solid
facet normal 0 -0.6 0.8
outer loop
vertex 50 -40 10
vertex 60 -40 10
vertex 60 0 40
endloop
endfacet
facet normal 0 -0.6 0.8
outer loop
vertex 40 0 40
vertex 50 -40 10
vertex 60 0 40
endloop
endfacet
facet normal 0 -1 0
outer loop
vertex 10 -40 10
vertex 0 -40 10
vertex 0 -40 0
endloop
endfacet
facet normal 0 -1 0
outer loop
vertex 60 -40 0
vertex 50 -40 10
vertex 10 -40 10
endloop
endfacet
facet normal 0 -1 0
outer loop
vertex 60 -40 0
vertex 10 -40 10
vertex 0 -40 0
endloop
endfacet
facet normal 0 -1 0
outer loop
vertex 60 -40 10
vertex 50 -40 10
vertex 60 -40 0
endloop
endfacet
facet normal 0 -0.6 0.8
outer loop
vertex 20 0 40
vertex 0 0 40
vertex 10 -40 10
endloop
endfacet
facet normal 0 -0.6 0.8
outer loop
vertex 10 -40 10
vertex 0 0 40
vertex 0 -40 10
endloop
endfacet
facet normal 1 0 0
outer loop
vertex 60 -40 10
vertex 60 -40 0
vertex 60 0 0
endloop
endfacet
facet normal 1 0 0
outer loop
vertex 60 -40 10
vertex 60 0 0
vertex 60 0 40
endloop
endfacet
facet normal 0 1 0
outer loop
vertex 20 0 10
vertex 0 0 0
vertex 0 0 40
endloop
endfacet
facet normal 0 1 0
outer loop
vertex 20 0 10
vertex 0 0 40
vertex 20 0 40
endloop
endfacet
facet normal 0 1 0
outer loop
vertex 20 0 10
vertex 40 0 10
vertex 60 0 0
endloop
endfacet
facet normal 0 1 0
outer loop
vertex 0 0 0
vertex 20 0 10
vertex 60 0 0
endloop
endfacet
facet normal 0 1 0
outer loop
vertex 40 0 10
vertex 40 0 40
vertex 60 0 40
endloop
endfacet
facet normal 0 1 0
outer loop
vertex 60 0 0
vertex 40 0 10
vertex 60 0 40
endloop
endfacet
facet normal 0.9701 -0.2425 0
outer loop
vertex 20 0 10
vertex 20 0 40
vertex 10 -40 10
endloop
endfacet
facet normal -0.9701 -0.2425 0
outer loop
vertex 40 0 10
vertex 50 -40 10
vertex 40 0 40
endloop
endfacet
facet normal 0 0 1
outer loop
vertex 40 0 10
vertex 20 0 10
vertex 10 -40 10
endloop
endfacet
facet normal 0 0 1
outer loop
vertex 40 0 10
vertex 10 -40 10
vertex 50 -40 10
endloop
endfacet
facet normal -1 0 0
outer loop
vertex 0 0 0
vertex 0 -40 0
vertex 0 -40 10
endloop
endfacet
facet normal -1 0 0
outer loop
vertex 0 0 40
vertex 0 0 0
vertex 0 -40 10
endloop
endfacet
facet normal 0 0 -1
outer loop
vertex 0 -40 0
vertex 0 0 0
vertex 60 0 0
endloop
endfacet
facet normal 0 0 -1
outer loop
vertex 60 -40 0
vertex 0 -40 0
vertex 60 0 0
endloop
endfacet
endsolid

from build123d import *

# Parameters (mm, degrees)
F0_W     = 60
F0_H     = 40
F1_DEPTH = 40
F3_DEPTH = 30
F5_DEPTH = 30
F7_DEPTH = 20
F9_DEPTH = 20


with BuildPart() as f1:
    # F0 (on Front) → F1 (new body)
    with BuildSketch(Plane.XZ):
        with Locations((30, 20)):
            Rectangle(F0_W, F0_H)
    extrude(amount=F1_DEPTH)

    # F2 (on face) → F3 (cut)
    with BuildSketch(Plane.XY.offset(40)):
        Polygon((30, 0), (30, -40), (50, -40), (40, 0), align=None)
    extrude(amount=-F3_DEPTH, mode=Mode.SUBTRACT)

    # F4 (on face) → F5 (cut)
    with BuildSketch(Plane.XY.offset(40)):
        Polygon((30, -40), (30, 0), (20, 0), (10, -40), align=None)
    extrude(amount=-F5_DEPTH, mode=Mode.SUBTRACT)

    # F6 (on face) → F7 (cut)
    with BuildSketch(Plane.YZ.offset(60)):
        Polygon((-40, 10), (0, 40), (-40, 40), align=None)
    extrude(amount=-F7_DEPTH, mode=Mode.SUBTRACT)

    # F8 (on face) → F9 (cut)
    with BuildSketch(Plane(origin=(0, 0, 0), x_dir=(0, -1, 0), z_dir=(-1, 0, 0))):
        Polygon((40, 40), (0, 40), (40, 10), align=None)
    extrude(amount=-F9_DEPTH, mode=Mode.SUBTRACT)


solid = f1.part
